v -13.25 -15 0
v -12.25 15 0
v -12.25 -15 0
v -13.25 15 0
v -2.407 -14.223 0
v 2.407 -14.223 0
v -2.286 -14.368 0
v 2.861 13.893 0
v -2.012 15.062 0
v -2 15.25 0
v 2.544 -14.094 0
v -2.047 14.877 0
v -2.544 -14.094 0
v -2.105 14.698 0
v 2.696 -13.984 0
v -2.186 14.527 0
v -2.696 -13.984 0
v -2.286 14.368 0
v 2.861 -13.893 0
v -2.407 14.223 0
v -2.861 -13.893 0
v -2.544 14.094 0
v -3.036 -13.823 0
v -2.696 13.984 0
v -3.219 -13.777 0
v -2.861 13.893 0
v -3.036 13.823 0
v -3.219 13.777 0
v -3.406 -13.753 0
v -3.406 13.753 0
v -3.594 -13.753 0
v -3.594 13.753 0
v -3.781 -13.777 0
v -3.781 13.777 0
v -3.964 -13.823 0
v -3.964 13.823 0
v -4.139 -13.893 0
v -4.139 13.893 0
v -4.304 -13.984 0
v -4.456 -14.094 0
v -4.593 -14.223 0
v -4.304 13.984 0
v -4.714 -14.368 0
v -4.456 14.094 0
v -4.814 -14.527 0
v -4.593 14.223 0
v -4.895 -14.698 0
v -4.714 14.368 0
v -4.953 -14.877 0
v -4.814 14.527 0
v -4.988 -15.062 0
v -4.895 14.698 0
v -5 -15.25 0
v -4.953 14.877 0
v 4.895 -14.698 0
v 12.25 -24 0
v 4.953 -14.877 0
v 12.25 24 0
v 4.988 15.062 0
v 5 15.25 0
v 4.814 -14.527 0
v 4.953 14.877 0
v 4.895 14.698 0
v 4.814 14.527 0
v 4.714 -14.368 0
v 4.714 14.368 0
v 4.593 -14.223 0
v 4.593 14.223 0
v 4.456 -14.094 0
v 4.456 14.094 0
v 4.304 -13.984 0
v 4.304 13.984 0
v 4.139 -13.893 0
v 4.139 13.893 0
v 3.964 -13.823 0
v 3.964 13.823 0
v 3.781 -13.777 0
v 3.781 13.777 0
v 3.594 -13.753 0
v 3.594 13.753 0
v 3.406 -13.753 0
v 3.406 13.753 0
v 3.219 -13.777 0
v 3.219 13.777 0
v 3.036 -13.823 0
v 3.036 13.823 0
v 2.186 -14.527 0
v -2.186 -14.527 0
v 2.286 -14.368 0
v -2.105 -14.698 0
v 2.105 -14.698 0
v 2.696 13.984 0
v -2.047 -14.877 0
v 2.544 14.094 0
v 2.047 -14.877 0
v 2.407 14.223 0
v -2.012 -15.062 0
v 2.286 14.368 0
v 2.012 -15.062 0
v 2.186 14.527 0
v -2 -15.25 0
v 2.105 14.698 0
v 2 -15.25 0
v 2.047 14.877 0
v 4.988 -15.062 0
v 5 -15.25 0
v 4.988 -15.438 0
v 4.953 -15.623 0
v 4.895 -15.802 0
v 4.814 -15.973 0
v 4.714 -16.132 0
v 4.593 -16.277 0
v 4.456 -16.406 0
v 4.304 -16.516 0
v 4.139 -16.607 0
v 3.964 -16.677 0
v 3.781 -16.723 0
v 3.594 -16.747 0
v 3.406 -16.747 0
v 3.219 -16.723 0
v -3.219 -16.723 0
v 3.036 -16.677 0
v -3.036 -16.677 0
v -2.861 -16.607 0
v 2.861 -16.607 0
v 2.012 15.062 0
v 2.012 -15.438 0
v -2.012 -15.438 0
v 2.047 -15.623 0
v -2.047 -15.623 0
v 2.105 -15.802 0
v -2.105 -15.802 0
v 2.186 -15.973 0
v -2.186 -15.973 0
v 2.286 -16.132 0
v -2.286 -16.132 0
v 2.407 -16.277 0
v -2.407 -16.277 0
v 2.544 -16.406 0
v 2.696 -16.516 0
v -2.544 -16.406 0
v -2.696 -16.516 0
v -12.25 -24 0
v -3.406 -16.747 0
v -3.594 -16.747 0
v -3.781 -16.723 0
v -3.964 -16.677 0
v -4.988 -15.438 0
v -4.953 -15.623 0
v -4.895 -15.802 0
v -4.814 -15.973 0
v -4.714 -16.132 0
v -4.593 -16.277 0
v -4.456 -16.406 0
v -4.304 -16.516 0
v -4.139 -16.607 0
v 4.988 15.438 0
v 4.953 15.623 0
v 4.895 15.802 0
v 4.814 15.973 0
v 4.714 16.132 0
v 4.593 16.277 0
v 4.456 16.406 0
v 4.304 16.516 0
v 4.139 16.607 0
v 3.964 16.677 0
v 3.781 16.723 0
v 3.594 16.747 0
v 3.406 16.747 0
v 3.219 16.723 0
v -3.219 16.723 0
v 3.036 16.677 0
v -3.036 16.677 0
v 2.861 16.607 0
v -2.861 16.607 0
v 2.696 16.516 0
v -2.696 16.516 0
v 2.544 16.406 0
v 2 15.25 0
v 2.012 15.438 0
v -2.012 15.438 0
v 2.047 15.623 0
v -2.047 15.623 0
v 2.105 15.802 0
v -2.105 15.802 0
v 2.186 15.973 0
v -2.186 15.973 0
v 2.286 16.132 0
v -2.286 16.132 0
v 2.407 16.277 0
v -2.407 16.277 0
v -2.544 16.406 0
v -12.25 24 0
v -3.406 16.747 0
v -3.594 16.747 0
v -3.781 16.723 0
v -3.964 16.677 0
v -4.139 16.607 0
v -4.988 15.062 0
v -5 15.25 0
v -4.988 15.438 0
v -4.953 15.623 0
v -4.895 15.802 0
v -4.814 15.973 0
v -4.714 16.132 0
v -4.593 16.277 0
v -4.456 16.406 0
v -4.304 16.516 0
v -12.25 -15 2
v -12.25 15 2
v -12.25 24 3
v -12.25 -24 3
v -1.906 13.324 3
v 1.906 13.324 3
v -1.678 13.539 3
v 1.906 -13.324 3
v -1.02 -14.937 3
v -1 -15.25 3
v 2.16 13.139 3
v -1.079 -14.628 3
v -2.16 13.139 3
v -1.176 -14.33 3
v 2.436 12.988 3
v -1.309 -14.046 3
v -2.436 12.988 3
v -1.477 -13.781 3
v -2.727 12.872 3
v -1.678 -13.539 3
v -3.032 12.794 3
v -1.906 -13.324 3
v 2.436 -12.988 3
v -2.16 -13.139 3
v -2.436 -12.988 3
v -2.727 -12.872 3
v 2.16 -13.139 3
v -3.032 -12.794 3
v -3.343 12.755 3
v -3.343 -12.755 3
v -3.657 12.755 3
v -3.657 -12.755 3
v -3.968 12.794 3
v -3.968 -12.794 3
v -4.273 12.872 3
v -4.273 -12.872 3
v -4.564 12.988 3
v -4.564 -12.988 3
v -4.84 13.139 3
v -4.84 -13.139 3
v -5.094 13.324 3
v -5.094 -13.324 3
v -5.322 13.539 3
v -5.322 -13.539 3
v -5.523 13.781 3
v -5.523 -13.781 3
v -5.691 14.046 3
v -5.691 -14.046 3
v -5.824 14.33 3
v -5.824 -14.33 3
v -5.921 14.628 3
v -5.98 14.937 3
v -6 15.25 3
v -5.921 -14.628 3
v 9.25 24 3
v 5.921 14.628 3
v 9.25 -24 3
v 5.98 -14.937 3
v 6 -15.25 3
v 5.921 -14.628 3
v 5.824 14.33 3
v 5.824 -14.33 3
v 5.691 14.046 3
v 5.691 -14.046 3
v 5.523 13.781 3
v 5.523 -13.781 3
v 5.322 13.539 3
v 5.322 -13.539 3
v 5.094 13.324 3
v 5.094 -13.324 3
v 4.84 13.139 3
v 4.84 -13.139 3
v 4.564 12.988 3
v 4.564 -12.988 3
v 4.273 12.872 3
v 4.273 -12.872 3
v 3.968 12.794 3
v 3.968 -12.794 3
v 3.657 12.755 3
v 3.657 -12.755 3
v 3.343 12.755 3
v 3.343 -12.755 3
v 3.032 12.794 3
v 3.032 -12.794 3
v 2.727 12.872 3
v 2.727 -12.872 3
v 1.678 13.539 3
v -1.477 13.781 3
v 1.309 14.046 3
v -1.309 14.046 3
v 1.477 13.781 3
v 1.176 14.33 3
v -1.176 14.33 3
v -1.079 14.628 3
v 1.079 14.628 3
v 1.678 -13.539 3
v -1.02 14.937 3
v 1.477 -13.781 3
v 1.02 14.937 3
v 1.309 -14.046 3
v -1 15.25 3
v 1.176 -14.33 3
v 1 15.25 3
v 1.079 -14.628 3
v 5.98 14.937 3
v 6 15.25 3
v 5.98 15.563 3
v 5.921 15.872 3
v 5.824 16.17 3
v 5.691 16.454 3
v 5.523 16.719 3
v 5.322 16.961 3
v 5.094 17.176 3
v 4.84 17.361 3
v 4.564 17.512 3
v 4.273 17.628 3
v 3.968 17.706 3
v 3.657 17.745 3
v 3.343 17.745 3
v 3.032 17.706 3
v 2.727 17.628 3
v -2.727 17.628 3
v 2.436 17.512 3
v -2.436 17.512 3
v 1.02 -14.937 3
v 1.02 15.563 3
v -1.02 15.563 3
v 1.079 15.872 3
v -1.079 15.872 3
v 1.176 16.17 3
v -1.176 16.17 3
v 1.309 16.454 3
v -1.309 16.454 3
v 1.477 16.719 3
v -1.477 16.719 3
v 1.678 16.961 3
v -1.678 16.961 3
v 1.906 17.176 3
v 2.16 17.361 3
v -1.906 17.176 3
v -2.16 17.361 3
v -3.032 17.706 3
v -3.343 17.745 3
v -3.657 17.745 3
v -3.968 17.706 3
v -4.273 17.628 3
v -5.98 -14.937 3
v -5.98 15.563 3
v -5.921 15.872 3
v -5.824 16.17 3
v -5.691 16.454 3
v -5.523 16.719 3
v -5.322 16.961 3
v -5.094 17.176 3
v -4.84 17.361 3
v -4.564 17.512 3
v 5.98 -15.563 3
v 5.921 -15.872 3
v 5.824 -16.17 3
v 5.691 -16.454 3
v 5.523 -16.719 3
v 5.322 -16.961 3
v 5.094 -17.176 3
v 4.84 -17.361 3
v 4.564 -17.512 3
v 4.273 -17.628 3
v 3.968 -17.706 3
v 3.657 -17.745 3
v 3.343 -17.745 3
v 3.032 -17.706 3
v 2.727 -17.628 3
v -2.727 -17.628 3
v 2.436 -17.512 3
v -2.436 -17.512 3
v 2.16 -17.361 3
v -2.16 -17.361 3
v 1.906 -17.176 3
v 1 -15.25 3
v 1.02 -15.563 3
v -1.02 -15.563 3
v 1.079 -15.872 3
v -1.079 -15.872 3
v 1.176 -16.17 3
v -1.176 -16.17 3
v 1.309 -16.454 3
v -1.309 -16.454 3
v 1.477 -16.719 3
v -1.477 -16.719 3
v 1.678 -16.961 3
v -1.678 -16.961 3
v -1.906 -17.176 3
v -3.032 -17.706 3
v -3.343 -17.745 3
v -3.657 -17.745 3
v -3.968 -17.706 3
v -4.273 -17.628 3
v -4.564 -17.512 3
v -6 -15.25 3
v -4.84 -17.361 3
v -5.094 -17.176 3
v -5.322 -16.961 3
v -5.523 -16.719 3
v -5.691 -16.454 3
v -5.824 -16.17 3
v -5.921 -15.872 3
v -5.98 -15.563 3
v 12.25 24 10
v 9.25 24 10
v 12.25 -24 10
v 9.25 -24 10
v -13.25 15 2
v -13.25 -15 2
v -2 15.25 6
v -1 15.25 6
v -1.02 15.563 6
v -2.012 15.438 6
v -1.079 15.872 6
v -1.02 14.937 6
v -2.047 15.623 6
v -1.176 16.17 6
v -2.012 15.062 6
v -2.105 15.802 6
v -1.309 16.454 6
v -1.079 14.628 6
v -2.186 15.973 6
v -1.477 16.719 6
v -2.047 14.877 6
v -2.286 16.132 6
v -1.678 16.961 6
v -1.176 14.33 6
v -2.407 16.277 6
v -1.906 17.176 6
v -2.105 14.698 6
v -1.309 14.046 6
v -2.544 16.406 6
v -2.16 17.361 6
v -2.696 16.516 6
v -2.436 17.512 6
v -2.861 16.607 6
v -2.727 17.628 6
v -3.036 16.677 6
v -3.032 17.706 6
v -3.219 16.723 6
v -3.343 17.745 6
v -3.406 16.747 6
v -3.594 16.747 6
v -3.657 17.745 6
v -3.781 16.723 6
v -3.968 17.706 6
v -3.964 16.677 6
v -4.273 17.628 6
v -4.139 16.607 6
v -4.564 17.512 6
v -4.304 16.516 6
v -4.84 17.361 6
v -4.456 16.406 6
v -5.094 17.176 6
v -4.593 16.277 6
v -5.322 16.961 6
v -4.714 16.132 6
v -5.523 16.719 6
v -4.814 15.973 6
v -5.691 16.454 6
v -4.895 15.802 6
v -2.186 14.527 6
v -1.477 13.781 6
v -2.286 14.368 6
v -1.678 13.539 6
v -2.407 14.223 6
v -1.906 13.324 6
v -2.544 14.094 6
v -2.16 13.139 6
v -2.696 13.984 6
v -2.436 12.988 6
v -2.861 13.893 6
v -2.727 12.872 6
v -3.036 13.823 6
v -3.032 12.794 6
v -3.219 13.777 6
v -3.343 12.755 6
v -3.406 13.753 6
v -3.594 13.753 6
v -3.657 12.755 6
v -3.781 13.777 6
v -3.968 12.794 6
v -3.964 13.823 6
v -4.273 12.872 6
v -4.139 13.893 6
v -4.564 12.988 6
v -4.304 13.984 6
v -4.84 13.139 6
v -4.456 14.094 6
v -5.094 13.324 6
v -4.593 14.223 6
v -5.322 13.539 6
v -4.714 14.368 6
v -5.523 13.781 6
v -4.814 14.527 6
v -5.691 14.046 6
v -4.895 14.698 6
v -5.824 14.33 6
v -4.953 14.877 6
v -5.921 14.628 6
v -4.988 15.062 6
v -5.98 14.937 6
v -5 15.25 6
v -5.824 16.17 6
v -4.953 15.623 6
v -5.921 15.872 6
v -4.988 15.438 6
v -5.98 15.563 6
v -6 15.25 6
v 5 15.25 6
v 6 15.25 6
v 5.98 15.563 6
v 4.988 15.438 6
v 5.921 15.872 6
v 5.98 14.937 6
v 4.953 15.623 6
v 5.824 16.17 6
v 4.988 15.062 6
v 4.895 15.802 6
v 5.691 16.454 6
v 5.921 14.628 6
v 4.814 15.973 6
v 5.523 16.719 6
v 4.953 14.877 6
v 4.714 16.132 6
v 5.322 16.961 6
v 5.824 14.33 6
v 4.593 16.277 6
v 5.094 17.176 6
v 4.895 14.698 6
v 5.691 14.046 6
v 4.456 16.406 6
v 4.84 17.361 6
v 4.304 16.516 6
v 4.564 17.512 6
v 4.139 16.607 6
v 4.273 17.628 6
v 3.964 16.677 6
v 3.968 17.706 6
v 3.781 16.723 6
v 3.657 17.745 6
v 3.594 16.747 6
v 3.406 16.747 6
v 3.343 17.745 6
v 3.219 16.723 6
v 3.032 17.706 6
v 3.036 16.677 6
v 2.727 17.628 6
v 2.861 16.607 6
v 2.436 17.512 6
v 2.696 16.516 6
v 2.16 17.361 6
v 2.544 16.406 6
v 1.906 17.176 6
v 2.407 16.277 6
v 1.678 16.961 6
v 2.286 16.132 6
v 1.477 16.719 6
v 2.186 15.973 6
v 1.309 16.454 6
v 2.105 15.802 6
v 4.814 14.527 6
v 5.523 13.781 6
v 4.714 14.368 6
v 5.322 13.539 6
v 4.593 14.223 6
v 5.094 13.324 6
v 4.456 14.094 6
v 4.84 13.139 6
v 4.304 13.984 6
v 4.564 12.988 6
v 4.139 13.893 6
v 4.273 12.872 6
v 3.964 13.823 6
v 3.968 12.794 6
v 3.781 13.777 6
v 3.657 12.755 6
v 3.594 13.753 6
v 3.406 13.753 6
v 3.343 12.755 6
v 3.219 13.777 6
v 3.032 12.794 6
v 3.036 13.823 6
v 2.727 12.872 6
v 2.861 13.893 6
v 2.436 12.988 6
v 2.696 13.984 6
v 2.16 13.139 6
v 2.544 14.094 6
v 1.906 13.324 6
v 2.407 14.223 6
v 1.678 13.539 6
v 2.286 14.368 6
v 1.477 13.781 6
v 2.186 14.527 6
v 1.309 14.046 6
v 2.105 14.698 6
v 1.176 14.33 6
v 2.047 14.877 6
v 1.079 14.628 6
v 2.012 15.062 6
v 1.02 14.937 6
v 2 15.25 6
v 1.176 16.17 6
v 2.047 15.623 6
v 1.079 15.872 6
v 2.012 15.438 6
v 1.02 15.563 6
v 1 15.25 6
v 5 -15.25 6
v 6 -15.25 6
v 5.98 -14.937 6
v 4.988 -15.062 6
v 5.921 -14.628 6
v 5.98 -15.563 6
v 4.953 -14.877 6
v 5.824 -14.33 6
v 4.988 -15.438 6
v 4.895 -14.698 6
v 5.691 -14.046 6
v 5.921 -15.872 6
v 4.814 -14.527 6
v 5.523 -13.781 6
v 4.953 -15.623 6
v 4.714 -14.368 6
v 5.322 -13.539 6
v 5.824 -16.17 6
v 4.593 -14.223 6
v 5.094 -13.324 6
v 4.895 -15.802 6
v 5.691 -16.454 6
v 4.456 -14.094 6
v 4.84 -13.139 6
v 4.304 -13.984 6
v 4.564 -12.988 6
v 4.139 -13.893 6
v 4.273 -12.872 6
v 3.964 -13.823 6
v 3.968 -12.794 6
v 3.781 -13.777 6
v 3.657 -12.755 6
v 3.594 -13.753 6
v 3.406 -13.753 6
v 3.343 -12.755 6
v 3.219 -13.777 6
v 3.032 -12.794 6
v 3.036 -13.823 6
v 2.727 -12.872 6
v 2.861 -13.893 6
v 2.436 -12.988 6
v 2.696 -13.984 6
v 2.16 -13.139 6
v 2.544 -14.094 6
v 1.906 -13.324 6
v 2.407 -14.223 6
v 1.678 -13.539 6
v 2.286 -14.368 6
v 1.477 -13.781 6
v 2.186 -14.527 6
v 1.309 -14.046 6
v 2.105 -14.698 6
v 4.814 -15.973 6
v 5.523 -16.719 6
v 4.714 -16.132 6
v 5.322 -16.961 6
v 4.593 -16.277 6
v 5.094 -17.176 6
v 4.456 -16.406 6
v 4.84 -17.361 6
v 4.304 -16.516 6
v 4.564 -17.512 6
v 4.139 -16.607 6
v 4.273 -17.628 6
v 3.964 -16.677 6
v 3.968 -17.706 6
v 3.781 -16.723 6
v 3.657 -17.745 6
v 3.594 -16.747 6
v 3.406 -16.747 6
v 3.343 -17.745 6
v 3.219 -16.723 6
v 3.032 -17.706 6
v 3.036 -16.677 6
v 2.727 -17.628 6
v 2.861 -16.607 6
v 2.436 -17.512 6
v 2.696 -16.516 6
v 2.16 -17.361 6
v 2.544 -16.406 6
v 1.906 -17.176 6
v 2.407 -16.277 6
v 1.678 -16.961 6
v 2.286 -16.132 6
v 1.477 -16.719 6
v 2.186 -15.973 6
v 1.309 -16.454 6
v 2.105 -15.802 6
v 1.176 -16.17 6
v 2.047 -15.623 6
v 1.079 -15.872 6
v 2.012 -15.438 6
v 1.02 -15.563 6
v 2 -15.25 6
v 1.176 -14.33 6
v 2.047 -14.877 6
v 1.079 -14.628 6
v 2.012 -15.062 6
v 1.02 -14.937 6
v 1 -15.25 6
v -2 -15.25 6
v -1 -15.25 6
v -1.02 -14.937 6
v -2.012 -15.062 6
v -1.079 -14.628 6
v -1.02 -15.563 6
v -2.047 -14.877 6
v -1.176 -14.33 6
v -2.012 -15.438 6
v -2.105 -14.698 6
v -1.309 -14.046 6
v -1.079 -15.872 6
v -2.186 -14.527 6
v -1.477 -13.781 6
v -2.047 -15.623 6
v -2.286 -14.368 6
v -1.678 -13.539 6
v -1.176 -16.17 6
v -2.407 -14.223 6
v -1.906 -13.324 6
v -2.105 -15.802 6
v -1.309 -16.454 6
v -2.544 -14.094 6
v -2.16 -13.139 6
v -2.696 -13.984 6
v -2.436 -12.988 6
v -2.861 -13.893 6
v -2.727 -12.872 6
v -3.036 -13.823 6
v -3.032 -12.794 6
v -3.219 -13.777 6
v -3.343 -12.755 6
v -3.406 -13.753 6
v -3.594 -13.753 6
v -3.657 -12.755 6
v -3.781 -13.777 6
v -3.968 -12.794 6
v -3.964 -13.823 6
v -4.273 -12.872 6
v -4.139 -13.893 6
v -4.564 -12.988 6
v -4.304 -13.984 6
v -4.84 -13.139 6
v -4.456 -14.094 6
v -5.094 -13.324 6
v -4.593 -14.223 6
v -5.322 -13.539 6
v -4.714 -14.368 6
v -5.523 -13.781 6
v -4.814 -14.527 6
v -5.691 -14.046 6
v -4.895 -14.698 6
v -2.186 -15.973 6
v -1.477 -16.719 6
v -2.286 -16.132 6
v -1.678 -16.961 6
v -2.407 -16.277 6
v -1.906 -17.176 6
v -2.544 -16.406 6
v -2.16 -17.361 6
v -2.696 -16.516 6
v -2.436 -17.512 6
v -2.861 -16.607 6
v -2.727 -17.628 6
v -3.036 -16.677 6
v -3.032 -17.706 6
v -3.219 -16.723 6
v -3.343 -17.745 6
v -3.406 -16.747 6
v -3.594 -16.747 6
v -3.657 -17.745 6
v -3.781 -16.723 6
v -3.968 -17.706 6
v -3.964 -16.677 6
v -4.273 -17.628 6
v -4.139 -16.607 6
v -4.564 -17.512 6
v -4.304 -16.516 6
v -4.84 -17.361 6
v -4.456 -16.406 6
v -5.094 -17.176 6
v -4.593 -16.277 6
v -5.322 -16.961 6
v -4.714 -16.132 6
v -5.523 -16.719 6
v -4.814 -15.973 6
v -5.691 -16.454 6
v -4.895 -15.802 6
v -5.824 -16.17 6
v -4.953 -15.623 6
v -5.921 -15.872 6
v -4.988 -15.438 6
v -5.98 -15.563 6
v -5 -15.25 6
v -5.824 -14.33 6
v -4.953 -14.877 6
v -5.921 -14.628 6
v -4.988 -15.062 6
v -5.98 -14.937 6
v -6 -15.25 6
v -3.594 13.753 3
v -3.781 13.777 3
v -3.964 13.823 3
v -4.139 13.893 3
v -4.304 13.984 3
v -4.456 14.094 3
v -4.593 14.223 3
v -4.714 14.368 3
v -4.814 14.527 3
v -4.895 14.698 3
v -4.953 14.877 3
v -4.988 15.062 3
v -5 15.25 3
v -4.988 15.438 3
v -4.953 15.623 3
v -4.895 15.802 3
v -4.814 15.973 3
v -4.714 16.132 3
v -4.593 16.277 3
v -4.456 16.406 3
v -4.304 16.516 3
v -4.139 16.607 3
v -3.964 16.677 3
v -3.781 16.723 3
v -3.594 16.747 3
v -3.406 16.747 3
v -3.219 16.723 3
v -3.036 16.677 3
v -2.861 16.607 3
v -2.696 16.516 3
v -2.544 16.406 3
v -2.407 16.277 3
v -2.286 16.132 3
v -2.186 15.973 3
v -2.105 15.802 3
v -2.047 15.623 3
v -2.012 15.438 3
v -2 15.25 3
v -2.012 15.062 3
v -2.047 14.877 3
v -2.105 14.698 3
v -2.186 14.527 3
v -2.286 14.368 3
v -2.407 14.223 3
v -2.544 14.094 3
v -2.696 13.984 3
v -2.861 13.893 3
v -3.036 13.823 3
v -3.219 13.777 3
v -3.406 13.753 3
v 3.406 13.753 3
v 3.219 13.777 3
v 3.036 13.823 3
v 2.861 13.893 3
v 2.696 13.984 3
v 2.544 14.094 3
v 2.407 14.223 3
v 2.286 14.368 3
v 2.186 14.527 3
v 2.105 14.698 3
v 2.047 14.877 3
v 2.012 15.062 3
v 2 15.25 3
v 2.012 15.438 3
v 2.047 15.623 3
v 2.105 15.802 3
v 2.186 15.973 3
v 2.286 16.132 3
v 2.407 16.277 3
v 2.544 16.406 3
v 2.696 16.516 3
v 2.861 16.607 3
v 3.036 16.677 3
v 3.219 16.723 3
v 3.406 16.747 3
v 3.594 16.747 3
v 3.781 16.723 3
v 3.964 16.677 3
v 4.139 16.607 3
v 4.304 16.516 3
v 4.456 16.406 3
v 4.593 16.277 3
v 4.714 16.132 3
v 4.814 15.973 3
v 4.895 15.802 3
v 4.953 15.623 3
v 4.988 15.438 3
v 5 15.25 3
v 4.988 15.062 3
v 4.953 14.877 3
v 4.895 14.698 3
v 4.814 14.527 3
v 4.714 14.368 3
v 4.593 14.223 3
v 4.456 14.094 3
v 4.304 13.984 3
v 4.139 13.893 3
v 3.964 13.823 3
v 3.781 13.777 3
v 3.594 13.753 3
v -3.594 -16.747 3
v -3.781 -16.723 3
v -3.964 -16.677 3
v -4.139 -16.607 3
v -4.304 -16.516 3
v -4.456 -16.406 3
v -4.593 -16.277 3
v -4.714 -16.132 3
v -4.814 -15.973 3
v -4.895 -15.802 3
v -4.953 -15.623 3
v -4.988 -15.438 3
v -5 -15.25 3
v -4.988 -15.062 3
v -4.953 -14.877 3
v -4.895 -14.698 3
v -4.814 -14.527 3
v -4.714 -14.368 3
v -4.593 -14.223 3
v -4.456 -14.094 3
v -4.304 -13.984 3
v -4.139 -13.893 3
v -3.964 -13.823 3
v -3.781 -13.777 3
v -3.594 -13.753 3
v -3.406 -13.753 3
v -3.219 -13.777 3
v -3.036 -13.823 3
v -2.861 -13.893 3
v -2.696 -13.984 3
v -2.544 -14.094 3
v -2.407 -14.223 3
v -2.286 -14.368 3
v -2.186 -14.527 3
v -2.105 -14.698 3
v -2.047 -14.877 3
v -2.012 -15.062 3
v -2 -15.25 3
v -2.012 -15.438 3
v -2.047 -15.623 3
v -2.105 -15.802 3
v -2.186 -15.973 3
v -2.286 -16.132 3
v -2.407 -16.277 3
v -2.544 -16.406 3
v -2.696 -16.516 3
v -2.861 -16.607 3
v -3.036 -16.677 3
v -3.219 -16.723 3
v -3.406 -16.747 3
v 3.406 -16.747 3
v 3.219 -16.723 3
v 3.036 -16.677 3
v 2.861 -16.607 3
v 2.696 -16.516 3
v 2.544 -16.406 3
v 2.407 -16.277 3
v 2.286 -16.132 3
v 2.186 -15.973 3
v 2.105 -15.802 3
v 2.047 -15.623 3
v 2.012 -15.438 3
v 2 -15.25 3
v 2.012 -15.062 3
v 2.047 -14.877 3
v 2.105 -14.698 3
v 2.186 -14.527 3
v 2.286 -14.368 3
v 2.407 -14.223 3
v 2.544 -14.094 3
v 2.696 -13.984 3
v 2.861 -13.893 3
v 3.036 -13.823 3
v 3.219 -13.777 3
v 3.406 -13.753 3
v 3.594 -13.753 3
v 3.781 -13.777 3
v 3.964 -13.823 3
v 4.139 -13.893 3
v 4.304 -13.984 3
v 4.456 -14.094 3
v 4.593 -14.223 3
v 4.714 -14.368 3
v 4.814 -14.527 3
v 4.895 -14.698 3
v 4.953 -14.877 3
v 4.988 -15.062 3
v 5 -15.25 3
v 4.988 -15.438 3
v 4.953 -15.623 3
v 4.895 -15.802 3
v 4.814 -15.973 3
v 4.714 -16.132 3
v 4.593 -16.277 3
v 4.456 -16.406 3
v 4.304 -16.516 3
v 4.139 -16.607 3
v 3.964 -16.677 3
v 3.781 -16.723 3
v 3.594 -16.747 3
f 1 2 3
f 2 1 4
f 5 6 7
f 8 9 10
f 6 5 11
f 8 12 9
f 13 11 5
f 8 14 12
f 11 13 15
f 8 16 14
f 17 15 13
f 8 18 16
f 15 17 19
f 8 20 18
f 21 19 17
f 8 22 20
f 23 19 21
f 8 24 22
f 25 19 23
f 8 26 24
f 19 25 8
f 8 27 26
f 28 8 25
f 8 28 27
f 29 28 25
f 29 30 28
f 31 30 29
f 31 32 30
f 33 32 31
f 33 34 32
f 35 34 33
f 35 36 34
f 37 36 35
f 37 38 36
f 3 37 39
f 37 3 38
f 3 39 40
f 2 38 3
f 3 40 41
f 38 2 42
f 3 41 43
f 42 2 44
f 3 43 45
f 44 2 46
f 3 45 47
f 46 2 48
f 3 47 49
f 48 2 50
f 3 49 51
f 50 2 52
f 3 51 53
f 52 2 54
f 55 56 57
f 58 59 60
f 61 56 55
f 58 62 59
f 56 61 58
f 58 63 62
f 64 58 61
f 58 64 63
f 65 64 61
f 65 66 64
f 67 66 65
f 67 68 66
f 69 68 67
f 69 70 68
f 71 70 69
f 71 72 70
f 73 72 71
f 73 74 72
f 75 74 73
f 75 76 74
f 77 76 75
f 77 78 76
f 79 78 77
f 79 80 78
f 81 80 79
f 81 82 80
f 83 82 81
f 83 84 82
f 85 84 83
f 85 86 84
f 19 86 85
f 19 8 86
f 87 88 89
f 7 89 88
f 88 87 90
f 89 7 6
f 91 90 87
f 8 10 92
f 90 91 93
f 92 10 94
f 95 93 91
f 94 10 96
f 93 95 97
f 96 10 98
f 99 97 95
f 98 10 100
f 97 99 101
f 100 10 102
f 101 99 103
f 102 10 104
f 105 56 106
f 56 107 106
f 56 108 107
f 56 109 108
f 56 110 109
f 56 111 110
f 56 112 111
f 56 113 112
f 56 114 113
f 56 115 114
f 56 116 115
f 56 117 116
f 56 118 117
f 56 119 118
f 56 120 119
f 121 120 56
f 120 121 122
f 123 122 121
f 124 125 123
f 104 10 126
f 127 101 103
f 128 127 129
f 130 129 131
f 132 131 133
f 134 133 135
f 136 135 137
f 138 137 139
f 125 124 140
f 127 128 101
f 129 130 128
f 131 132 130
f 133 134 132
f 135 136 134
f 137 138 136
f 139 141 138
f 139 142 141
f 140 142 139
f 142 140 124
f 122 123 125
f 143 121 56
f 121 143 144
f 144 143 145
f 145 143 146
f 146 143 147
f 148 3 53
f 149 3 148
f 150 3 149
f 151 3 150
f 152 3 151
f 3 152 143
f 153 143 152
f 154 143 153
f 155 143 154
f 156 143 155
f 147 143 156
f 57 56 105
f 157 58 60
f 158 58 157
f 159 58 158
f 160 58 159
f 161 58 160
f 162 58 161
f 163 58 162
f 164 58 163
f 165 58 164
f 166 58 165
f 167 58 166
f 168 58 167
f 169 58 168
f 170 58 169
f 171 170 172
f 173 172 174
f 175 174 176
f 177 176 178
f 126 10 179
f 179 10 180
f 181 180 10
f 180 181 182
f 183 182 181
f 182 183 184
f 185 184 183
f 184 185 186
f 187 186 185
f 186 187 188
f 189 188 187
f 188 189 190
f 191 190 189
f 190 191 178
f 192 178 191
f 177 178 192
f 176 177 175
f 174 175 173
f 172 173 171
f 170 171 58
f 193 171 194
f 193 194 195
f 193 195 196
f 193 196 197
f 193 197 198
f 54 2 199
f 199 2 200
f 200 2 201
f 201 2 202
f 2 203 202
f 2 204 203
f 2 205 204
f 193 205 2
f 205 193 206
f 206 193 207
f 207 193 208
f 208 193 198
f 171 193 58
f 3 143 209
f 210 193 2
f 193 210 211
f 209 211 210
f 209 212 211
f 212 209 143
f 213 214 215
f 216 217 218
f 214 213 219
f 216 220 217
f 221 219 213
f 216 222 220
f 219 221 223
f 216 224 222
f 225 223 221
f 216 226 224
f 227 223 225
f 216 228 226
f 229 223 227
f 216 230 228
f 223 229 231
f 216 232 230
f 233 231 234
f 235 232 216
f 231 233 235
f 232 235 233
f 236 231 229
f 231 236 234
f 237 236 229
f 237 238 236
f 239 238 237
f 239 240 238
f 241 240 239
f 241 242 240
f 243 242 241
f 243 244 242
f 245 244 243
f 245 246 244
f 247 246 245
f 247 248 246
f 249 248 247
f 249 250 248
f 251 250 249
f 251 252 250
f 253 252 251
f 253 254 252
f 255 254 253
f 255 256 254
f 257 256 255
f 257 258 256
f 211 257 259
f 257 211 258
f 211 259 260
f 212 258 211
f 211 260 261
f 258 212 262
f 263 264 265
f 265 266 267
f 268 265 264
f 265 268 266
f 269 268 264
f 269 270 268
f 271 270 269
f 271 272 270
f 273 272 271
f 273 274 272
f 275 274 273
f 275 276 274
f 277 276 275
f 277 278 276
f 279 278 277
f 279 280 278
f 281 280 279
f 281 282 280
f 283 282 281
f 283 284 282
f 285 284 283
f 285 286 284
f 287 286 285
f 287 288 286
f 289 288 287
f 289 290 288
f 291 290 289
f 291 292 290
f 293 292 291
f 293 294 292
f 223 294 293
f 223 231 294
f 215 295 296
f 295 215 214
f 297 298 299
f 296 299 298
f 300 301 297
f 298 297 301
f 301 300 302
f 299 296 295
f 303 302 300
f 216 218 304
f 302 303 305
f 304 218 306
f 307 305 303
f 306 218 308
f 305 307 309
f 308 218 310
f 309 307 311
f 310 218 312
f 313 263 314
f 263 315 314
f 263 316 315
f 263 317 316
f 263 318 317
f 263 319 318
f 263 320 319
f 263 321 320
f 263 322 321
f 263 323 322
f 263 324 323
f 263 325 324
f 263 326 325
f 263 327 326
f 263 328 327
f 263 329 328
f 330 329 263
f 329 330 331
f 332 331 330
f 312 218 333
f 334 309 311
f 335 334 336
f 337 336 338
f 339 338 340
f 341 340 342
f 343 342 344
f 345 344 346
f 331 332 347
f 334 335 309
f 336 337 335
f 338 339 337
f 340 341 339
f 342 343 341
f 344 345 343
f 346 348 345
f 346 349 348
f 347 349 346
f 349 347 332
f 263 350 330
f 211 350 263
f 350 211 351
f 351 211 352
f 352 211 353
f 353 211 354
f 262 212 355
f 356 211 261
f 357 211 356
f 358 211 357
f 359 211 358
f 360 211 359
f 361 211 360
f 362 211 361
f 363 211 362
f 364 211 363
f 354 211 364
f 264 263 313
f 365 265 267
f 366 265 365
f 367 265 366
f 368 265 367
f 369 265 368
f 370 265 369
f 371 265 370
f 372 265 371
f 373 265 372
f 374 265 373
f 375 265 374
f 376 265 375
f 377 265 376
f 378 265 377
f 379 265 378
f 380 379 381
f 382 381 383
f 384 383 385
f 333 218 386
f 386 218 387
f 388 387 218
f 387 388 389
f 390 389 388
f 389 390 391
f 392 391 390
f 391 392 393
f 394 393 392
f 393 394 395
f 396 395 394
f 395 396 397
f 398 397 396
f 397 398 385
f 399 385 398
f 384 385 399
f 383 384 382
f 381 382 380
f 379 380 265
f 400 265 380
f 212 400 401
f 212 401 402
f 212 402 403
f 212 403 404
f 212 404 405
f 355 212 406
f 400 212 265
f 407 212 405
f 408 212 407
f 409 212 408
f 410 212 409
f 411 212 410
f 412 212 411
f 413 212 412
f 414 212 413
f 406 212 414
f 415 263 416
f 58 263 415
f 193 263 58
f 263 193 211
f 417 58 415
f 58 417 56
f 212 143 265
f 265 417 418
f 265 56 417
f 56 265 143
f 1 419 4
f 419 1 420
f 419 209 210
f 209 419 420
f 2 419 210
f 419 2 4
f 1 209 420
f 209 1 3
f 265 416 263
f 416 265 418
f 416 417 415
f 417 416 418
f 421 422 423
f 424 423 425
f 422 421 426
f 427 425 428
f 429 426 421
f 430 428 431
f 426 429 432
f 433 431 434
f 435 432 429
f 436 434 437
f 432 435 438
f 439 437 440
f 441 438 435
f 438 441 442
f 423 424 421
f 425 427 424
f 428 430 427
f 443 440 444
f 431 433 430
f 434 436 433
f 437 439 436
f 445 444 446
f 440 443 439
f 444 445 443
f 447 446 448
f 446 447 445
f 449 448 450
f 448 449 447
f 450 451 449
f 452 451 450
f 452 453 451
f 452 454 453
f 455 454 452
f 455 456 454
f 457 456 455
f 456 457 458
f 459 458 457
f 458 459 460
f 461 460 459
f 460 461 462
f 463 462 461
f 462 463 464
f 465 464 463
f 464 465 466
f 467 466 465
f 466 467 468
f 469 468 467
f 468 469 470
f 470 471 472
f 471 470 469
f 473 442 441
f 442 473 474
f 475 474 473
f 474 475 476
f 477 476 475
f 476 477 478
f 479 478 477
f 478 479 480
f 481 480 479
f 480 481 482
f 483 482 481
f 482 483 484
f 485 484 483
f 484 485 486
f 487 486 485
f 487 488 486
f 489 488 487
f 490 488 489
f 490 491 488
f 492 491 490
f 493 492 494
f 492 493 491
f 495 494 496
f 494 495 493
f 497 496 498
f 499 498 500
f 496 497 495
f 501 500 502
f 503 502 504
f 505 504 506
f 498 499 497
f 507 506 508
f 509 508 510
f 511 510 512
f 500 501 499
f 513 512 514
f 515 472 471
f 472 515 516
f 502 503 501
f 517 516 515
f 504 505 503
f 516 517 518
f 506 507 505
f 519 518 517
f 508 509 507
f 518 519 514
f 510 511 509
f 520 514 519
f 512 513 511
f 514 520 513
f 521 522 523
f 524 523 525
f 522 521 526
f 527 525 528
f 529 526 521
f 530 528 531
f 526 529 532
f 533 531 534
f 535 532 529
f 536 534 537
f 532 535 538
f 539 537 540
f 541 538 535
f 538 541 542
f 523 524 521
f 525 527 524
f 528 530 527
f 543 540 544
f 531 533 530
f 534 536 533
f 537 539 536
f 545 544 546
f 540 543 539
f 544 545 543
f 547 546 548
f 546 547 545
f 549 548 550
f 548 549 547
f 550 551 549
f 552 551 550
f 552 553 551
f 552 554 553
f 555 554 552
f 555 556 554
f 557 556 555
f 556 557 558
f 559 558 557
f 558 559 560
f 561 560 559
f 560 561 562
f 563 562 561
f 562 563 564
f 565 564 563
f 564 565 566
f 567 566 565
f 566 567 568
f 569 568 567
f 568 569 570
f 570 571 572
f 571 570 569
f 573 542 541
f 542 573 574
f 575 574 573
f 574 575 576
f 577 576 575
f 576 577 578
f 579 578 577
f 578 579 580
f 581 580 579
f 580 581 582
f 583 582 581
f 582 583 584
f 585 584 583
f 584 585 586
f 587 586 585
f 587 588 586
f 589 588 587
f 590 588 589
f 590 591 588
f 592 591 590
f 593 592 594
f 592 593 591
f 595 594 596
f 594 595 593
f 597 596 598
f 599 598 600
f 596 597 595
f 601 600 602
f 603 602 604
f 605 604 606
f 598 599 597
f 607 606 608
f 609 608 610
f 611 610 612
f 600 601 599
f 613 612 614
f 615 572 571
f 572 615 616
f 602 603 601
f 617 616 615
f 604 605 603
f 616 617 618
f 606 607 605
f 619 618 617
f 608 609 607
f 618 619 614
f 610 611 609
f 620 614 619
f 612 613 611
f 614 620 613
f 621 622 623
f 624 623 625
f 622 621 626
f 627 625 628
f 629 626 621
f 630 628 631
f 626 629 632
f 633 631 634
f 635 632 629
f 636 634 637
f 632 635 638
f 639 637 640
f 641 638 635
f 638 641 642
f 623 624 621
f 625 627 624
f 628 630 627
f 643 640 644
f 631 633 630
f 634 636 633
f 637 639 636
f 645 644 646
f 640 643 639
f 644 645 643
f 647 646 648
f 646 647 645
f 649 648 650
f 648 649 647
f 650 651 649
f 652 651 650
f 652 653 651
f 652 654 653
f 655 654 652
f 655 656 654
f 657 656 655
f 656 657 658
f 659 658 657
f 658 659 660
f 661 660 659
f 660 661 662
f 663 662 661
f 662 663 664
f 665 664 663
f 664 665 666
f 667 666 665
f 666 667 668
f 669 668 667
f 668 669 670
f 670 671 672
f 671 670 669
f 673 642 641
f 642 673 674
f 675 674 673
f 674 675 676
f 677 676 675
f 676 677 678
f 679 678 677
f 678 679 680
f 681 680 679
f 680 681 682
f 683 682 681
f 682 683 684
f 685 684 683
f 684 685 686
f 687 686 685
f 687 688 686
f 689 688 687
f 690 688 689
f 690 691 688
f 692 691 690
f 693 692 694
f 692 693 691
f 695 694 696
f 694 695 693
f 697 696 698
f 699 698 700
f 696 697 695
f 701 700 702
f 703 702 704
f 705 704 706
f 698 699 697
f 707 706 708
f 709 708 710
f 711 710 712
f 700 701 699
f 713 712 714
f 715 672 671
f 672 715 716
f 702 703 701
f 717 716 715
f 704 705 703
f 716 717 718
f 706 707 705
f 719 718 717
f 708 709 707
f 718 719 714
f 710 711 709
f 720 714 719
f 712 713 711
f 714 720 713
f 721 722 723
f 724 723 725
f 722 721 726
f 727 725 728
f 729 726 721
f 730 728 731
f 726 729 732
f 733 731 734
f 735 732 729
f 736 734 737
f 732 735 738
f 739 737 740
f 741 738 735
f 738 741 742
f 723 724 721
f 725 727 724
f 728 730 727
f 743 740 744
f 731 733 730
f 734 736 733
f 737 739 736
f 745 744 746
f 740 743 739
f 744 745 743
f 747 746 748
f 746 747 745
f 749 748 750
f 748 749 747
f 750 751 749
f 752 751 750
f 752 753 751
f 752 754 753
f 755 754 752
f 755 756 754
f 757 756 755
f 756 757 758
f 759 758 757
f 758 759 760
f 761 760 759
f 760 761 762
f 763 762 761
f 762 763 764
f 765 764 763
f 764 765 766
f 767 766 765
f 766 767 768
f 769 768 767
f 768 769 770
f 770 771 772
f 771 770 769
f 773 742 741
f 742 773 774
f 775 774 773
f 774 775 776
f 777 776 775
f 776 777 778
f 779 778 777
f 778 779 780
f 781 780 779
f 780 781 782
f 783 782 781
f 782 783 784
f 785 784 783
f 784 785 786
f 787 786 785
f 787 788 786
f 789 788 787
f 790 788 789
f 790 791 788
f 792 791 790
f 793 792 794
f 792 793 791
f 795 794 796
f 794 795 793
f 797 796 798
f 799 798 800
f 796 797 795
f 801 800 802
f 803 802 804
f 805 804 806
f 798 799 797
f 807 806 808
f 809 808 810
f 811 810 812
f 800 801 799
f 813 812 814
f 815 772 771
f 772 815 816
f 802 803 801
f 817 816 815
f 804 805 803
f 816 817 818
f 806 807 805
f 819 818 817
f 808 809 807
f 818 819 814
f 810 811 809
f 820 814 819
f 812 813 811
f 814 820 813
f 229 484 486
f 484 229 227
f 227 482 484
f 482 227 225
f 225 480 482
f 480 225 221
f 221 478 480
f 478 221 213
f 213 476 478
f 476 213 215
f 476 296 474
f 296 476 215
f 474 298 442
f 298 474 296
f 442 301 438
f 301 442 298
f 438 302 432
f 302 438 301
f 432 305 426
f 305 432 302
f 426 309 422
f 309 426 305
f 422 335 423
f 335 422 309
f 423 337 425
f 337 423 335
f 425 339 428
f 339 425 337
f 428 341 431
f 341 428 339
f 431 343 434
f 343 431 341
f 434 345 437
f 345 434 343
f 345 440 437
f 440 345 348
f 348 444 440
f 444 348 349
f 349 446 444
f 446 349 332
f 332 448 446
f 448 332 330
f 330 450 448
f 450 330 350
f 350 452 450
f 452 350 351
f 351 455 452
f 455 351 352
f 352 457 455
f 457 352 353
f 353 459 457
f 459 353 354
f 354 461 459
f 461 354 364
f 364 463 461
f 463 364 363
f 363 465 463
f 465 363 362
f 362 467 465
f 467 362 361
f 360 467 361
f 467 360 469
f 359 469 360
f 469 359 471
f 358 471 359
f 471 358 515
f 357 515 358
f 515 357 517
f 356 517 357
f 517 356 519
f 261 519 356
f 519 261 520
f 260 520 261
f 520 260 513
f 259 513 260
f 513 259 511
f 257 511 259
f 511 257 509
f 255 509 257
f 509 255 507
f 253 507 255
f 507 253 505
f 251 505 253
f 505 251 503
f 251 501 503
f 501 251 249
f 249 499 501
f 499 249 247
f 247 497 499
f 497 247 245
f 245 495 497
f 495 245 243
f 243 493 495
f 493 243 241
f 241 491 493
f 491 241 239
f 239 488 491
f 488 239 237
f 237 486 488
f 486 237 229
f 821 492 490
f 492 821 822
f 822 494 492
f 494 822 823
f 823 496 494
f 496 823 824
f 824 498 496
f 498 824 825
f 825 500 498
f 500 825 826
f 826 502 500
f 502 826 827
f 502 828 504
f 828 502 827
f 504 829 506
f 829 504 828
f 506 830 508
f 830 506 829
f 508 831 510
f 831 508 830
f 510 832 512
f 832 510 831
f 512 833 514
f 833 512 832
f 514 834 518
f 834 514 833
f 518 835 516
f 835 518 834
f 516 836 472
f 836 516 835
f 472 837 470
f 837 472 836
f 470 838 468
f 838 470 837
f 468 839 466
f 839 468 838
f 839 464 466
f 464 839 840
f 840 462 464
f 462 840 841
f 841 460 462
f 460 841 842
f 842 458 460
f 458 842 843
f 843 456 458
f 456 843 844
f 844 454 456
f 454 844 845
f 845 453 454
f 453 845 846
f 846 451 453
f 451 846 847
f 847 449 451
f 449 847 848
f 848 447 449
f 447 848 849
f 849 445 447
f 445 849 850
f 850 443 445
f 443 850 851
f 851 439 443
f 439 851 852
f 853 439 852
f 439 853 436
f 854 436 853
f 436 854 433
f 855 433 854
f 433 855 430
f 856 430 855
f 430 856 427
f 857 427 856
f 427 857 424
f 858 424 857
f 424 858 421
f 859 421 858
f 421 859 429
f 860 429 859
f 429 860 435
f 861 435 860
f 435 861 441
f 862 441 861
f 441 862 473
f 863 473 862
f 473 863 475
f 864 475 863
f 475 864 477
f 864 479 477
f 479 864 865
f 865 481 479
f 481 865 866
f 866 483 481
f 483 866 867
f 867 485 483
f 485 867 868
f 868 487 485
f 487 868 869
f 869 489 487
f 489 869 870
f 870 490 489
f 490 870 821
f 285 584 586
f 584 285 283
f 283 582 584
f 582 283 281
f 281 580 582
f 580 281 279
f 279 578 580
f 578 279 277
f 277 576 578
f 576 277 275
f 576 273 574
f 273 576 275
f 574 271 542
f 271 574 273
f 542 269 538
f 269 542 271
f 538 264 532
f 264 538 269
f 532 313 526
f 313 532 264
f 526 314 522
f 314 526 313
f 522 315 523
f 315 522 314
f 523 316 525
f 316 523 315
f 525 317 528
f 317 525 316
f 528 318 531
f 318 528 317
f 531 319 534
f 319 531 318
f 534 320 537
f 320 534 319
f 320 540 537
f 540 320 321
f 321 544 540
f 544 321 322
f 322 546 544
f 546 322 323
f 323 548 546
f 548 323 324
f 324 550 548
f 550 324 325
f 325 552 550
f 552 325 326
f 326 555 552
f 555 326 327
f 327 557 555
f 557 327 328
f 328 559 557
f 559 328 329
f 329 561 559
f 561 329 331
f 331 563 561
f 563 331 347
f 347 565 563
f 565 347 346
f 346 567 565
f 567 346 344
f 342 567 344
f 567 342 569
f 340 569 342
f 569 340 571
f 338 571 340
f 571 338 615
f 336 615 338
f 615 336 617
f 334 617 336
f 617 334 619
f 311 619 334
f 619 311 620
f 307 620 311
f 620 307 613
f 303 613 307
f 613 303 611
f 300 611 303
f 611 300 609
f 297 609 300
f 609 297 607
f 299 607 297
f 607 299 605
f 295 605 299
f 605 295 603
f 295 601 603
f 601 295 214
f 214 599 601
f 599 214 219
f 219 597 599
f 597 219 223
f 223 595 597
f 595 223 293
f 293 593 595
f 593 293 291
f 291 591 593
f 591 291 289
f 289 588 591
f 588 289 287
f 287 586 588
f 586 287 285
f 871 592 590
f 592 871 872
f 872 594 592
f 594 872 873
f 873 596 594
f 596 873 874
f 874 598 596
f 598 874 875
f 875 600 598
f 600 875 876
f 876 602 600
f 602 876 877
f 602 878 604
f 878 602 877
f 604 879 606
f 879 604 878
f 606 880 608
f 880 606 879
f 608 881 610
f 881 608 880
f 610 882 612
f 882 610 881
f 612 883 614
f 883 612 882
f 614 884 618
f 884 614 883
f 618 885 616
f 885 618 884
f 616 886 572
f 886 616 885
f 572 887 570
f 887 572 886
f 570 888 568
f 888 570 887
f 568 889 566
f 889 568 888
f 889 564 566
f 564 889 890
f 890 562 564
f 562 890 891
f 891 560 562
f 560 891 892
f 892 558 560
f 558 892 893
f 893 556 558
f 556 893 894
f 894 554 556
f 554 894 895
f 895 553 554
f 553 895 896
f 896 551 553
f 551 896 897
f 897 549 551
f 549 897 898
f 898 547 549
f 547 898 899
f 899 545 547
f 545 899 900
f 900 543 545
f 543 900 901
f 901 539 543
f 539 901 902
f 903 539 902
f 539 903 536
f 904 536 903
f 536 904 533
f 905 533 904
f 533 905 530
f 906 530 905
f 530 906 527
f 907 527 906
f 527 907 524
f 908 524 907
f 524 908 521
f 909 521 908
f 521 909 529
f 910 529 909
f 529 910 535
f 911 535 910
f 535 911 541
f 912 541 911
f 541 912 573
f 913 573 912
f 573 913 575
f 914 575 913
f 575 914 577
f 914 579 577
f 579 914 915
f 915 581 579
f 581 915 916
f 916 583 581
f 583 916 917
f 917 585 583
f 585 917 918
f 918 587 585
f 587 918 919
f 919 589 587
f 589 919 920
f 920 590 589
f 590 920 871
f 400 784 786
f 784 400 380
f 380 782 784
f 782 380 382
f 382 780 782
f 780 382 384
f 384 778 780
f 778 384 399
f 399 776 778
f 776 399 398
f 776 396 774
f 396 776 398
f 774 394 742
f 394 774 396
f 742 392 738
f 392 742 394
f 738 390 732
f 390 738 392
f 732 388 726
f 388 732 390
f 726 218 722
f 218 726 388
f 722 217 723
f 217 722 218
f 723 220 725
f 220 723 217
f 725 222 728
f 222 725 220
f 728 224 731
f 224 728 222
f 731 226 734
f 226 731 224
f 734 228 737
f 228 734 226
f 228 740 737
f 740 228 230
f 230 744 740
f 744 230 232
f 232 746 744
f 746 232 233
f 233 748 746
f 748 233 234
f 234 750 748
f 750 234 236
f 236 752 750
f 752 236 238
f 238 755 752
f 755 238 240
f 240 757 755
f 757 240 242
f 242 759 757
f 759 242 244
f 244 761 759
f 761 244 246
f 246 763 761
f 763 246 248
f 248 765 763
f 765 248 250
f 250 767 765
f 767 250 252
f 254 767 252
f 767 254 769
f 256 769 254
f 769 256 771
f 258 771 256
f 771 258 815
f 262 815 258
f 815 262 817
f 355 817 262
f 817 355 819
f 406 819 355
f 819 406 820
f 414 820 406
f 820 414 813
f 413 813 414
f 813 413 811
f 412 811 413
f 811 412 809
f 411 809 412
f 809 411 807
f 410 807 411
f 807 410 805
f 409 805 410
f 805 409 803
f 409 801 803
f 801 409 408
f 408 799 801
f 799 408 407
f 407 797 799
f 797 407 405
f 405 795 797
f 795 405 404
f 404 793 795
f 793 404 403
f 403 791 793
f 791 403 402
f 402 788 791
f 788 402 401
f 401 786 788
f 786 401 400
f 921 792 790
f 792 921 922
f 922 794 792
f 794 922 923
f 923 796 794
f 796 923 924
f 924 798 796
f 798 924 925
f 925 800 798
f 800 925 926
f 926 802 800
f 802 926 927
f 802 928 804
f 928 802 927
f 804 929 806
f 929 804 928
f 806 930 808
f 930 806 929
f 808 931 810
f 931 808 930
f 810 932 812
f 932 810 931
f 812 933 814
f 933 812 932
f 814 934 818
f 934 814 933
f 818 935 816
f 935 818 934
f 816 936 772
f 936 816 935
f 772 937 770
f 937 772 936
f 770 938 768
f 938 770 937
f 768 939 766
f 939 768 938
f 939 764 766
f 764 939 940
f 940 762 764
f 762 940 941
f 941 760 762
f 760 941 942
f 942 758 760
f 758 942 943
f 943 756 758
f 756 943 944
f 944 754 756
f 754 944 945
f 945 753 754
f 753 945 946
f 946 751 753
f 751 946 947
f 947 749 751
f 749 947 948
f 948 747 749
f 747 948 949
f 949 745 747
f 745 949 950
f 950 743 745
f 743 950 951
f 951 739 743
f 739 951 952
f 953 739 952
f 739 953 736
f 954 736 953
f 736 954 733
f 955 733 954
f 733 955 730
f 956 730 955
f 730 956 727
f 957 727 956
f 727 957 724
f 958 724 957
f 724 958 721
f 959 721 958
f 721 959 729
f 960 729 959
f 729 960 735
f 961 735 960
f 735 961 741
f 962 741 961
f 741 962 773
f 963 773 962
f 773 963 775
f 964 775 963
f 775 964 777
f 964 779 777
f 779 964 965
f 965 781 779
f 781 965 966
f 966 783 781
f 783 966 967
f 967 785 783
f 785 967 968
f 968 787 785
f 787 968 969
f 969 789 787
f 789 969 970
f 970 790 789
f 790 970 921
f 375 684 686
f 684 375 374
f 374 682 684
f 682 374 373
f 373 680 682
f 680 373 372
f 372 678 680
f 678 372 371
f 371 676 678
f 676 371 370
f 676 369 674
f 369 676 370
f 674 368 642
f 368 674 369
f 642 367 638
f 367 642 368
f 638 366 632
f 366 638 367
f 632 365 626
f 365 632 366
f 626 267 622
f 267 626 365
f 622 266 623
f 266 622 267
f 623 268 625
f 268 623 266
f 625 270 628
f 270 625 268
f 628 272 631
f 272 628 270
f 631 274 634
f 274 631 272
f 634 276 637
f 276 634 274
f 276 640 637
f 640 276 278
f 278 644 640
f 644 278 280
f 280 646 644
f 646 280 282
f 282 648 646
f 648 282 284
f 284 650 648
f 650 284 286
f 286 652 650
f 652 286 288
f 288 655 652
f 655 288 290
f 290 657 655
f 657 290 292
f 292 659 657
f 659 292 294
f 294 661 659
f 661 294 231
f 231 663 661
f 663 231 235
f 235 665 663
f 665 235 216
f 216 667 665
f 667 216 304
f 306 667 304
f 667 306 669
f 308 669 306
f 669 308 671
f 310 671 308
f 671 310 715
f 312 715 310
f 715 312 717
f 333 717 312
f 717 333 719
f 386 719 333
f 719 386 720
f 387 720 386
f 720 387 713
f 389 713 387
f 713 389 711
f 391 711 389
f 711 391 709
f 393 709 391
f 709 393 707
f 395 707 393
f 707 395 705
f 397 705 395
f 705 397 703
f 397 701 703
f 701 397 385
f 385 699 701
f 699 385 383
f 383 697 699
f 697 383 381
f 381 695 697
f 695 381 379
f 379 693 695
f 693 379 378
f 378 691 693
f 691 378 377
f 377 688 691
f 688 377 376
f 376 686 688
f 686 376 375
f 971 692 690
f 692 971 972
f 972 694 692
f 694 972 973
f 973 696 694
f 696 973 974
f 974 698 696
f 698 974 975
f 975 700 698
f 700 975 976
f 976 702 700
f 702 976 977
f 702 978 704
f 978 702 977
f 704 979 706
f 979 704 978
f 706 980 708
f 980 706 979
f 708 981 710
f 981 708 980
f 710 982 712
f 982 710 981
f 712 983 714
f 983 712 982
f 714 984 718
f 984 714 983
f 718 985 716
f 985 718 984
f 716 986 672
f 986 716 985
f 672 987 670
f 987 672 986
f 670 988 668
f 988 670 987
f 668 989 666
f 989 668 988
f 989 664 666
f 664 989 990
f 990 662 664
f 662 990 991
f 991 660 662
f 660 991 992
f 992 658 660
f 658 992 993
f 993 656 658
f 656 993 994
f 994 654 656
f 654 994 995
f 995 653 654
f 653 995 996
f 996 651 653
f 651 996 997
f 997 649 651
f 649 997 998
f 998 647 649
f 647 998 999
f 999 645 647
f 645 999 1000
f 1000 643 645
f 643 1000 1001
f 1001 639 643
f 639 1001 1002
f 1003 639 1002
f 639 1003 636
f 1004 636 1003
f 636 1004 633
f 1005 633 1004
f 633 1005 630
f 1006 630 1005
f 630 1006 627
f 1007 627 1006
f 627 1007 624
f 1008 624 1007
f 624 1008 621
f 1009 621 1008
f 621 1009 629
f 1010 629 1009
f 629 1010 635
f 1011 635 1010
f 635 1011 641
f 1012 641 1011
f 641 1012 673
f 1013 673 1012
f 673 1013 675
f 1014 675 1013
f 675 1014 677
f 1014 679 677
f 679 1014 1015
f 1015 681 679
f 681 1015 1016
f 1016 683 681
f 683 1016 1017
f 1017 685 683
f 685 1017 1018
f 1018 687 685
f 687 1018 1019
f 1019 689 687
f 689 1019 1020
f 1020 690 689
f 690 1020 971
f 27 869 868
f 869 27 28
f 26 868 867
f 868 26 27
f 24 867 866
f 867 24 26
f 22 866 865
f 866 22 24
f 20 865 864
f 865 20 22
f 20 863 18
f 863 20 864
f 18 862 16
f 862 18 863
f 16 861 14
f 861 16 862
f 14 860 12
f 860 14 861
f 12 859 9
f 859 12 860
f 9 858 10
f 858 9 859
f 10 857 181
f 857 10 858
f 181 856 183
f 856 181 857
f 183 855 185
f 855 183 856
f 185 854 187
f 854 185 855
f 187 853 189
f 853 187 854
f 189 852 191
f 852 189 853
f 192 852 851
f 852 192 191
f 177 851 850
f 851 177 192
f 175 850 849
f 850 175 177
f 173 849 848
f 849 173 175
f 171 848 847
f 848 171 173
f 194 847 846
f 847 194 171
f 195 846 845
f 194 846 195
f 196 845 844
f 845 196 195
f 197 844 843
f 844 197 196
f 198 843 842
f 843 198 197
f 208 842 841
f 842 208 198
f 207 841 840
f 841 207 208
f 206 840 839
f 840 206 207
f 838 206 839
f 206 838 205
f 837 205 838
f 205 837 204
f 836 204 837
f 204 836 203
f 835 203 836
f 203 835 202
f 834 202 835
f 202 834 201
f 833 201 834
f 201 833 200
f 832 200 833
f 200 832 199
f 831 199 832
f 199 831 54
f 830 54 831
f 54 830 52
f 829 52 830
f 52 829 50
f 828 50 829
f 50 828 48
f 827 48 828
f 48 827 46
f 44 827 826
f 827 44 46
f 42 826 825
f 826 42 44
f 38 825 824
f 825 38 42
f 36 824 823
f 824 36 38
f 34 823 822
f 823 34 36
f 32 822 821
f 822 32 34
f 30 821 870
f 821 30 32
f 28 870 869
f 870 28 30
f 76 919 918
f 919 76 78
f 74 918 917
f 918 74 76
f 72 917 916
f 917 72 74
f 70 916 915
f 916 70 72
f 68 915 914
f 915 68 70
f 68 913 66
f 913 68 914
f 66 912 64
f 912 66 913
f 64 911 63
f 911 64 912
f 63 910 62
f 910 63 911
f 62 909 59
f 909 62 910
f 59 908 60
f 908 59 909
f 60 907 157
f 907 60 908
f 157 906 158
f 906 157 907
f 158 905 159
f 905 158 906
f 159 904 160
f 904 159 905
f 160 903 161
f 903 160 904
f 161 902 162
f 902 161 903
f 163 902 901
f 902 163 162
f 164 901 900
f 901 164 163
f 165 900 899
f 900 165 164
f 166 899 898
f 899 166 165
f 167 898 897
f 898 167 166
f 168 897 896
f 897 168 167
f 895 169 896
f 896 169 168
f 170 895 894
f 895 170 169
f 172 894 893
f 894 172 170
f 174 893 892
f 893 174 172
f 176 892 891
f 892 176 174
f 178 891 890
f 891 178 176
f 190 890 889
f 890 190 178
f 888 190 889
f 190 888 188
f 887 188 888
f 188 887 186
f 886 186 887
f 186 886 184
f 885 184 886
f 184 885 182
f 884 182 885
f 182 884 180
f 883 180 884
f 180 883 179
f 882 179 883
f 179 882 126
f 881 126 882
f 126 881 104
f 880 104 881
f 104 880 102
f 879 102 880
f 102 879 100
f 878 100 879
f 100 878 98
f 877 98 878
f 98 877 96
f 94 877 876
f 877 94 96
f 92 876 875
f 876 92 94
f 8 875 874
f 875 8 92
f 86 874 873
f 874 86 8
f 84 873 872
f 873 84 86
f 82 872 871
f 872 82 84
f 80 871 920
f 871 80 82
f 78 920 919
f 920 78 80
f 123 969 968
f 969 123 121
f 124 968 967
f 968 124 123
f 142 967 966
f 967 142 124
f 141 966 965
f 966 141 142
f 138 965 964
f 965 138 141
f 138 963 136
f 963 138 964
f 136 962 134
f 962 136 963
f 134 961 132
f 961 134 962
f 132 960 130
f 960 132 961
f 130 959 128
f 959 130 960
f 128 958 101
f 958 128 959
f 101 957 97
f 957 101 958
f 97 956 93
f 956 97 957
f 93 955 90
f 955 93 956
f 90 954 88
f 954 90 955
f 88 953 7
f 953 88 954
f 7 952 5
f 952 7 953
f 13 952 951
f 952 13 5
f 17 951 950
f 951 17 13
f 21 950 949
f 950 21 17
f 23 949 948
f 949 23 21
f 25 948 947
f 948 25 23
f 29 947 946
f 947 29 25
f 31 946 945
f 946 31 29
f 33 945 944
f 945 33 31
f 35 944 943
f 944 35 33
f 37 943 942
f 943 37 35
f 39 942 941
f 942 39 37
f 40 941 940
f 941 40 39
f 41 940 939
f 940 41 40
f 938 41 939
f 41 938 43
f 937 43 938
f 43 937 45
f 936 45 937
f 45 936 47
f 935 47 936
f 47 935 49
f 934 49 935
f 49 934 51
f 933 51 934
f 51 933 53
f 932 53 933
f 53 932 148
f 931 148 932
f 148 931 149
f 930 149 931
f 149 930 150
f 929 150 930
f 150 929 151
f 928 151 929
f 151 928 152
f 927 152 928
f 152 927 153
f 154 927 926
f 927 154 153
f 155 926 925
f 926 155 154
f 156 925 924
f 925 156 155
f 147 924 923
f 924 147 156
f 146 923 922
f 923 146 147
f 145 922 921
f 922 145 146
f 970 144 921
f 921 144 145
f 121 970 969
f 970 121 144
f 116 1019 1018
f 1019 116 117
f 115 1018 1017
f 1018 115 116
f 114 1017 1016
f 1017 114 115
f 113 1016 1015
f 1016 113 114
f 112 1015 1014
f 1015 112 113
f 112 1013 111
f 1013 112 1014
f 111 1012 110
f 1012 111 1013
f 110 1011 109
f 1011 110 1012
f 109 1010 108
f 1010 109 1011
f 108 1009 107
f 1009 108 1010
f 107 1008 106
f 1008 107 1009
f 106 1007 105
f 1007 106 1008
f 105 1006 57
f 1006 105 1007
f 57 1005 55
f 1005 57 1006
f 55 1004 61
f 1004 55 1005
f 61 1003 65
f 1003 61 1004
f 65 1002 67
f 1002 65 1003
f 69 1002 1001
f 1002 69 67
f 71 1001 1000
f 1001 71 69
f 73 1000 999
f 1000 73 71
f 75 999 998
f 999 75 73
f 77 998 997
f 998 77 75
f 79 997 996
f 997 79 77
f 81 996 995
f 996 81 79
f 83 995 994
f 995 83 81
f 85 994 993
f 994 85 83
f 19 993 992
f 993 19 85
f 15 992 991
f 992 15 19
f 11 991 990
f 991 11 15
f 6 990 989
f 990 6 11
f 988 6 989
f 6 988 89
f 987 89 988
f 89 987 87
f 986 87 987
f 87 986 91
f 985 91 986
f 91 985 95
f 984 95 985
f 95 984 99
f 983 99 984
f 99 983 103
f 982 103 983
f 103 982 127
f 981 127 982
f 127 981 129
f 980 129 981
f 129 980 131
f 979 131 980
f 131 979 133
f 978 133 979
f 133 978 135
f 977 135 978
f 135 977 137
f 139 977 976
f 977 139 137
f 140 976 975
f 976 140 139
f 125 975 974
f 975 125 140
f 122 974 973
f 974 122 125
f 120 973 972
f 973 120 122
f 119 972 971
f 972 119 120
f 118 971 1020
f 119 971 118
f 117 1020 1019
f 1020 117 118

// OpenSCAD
$fn = 50;

// taken from chassis datasheet
wall_thickness = 1.5;
chassis_inner_thickness = 26 - wall_thickness;

// the printed element is a sum of simple boxes
// this is the default thickness of them
mainboard_thickness = 3;

// The dent holds the holder in Z position
// it is placed between bottom and top chassis
// the top chassis has an inner aureola that
// doesn't touch the bottom chassis
// this space is where the dent goes
module upper_dent_3d() {
    // taken from chassis 3d model
    x = chassis_inner_thickness + 0.5;
    y = 30;
    z = 4.5 - 2.5;

    translate([-wall_thickness/2, 0, 0])
    linear_extrude(height = z)
    square([x, y], center = true);
}

// bottom part to make sure PCB stays in place
module bottom_bar_3d() { 
    // taken from chassis datasheet 
    x = mainboard_thickness;
    y = 48;
    z = 10;
    
    translate([chassis_inner_thickness/2 - x/2, 0, 0])
    linear_extrude(height = z)
    square([x, y], center = true);
}

// helper to create a single nut insertion
module insert_nut_wall_2d(x, y, inner_d, outer_d) {
    translate([x, y, 0]) {
        difference() {
            circle(d = outer_d);
            circle(d = inner_d);
        }
    }
}

// four nuts to mount the PCB
module pcb_nuts_holders_3d(x, y, d_in, thickness, z) {
    d_out = d_in + thickness;
    
    linear_extrude(height = z) {
        for (sx = [-1, 1]) {
            for (sy = [-1, 1]) {
                insert_nut_wall_2d(sx*x, sy*y, d_in, d_out);
            }
        }
    }
}

module nuts_cutout_3d(x, y, d_in, z) {
    linear_extrude(height = z) {
        for (sx = [-1, 1]) {
            for (sy = [-1, 1]) {
                translate([sx*x, sy*y, 0]) 
                    circle(d = d_in);
            }
        }
    }
}

// part where all other parts connect to
module mainboard_3d() {
    // taken from chassis datasheet
    linear_extrude(height = mainboard_thickness)
    square([chassis_inner_thickness, 48], center = true);
}

// instantiate all modules
// union not needed but made for FreeCAD export issues
module main_pcb_holder_3d() {
    // X-Y positions taken from kicad model
    // for the auxiliary board
    x = 3.5;
    y = 30.5 / 2;
    
    // Heat Set Insert Nuts diameter from specs
    // 4mm outside, make tight so it stays
    d_in_holder = 4 - 1;
    thickness = 2;
    z_holder = mainboard_thickness + 3;
    z_cutout = mainboard_thickness;
    
    difference() {
        union() {
            mainboard_3d();
            upper_dent_3d();
            bottom_bar_3d();
            pcb_nuts_holders_3d(x, y, d_in_holder, thickness, z_holder);
        }
        nuts_cutout_3d(x, y, d_in_holder, z_cutout);
    }
}

main_pcb_holder_3d();

// DONT FORGET TO ADD FILLETS in FREECAD
// they are important because printed part will
// fit to chassis that already has fillets
// they can't be omitted, parts won't fit!
